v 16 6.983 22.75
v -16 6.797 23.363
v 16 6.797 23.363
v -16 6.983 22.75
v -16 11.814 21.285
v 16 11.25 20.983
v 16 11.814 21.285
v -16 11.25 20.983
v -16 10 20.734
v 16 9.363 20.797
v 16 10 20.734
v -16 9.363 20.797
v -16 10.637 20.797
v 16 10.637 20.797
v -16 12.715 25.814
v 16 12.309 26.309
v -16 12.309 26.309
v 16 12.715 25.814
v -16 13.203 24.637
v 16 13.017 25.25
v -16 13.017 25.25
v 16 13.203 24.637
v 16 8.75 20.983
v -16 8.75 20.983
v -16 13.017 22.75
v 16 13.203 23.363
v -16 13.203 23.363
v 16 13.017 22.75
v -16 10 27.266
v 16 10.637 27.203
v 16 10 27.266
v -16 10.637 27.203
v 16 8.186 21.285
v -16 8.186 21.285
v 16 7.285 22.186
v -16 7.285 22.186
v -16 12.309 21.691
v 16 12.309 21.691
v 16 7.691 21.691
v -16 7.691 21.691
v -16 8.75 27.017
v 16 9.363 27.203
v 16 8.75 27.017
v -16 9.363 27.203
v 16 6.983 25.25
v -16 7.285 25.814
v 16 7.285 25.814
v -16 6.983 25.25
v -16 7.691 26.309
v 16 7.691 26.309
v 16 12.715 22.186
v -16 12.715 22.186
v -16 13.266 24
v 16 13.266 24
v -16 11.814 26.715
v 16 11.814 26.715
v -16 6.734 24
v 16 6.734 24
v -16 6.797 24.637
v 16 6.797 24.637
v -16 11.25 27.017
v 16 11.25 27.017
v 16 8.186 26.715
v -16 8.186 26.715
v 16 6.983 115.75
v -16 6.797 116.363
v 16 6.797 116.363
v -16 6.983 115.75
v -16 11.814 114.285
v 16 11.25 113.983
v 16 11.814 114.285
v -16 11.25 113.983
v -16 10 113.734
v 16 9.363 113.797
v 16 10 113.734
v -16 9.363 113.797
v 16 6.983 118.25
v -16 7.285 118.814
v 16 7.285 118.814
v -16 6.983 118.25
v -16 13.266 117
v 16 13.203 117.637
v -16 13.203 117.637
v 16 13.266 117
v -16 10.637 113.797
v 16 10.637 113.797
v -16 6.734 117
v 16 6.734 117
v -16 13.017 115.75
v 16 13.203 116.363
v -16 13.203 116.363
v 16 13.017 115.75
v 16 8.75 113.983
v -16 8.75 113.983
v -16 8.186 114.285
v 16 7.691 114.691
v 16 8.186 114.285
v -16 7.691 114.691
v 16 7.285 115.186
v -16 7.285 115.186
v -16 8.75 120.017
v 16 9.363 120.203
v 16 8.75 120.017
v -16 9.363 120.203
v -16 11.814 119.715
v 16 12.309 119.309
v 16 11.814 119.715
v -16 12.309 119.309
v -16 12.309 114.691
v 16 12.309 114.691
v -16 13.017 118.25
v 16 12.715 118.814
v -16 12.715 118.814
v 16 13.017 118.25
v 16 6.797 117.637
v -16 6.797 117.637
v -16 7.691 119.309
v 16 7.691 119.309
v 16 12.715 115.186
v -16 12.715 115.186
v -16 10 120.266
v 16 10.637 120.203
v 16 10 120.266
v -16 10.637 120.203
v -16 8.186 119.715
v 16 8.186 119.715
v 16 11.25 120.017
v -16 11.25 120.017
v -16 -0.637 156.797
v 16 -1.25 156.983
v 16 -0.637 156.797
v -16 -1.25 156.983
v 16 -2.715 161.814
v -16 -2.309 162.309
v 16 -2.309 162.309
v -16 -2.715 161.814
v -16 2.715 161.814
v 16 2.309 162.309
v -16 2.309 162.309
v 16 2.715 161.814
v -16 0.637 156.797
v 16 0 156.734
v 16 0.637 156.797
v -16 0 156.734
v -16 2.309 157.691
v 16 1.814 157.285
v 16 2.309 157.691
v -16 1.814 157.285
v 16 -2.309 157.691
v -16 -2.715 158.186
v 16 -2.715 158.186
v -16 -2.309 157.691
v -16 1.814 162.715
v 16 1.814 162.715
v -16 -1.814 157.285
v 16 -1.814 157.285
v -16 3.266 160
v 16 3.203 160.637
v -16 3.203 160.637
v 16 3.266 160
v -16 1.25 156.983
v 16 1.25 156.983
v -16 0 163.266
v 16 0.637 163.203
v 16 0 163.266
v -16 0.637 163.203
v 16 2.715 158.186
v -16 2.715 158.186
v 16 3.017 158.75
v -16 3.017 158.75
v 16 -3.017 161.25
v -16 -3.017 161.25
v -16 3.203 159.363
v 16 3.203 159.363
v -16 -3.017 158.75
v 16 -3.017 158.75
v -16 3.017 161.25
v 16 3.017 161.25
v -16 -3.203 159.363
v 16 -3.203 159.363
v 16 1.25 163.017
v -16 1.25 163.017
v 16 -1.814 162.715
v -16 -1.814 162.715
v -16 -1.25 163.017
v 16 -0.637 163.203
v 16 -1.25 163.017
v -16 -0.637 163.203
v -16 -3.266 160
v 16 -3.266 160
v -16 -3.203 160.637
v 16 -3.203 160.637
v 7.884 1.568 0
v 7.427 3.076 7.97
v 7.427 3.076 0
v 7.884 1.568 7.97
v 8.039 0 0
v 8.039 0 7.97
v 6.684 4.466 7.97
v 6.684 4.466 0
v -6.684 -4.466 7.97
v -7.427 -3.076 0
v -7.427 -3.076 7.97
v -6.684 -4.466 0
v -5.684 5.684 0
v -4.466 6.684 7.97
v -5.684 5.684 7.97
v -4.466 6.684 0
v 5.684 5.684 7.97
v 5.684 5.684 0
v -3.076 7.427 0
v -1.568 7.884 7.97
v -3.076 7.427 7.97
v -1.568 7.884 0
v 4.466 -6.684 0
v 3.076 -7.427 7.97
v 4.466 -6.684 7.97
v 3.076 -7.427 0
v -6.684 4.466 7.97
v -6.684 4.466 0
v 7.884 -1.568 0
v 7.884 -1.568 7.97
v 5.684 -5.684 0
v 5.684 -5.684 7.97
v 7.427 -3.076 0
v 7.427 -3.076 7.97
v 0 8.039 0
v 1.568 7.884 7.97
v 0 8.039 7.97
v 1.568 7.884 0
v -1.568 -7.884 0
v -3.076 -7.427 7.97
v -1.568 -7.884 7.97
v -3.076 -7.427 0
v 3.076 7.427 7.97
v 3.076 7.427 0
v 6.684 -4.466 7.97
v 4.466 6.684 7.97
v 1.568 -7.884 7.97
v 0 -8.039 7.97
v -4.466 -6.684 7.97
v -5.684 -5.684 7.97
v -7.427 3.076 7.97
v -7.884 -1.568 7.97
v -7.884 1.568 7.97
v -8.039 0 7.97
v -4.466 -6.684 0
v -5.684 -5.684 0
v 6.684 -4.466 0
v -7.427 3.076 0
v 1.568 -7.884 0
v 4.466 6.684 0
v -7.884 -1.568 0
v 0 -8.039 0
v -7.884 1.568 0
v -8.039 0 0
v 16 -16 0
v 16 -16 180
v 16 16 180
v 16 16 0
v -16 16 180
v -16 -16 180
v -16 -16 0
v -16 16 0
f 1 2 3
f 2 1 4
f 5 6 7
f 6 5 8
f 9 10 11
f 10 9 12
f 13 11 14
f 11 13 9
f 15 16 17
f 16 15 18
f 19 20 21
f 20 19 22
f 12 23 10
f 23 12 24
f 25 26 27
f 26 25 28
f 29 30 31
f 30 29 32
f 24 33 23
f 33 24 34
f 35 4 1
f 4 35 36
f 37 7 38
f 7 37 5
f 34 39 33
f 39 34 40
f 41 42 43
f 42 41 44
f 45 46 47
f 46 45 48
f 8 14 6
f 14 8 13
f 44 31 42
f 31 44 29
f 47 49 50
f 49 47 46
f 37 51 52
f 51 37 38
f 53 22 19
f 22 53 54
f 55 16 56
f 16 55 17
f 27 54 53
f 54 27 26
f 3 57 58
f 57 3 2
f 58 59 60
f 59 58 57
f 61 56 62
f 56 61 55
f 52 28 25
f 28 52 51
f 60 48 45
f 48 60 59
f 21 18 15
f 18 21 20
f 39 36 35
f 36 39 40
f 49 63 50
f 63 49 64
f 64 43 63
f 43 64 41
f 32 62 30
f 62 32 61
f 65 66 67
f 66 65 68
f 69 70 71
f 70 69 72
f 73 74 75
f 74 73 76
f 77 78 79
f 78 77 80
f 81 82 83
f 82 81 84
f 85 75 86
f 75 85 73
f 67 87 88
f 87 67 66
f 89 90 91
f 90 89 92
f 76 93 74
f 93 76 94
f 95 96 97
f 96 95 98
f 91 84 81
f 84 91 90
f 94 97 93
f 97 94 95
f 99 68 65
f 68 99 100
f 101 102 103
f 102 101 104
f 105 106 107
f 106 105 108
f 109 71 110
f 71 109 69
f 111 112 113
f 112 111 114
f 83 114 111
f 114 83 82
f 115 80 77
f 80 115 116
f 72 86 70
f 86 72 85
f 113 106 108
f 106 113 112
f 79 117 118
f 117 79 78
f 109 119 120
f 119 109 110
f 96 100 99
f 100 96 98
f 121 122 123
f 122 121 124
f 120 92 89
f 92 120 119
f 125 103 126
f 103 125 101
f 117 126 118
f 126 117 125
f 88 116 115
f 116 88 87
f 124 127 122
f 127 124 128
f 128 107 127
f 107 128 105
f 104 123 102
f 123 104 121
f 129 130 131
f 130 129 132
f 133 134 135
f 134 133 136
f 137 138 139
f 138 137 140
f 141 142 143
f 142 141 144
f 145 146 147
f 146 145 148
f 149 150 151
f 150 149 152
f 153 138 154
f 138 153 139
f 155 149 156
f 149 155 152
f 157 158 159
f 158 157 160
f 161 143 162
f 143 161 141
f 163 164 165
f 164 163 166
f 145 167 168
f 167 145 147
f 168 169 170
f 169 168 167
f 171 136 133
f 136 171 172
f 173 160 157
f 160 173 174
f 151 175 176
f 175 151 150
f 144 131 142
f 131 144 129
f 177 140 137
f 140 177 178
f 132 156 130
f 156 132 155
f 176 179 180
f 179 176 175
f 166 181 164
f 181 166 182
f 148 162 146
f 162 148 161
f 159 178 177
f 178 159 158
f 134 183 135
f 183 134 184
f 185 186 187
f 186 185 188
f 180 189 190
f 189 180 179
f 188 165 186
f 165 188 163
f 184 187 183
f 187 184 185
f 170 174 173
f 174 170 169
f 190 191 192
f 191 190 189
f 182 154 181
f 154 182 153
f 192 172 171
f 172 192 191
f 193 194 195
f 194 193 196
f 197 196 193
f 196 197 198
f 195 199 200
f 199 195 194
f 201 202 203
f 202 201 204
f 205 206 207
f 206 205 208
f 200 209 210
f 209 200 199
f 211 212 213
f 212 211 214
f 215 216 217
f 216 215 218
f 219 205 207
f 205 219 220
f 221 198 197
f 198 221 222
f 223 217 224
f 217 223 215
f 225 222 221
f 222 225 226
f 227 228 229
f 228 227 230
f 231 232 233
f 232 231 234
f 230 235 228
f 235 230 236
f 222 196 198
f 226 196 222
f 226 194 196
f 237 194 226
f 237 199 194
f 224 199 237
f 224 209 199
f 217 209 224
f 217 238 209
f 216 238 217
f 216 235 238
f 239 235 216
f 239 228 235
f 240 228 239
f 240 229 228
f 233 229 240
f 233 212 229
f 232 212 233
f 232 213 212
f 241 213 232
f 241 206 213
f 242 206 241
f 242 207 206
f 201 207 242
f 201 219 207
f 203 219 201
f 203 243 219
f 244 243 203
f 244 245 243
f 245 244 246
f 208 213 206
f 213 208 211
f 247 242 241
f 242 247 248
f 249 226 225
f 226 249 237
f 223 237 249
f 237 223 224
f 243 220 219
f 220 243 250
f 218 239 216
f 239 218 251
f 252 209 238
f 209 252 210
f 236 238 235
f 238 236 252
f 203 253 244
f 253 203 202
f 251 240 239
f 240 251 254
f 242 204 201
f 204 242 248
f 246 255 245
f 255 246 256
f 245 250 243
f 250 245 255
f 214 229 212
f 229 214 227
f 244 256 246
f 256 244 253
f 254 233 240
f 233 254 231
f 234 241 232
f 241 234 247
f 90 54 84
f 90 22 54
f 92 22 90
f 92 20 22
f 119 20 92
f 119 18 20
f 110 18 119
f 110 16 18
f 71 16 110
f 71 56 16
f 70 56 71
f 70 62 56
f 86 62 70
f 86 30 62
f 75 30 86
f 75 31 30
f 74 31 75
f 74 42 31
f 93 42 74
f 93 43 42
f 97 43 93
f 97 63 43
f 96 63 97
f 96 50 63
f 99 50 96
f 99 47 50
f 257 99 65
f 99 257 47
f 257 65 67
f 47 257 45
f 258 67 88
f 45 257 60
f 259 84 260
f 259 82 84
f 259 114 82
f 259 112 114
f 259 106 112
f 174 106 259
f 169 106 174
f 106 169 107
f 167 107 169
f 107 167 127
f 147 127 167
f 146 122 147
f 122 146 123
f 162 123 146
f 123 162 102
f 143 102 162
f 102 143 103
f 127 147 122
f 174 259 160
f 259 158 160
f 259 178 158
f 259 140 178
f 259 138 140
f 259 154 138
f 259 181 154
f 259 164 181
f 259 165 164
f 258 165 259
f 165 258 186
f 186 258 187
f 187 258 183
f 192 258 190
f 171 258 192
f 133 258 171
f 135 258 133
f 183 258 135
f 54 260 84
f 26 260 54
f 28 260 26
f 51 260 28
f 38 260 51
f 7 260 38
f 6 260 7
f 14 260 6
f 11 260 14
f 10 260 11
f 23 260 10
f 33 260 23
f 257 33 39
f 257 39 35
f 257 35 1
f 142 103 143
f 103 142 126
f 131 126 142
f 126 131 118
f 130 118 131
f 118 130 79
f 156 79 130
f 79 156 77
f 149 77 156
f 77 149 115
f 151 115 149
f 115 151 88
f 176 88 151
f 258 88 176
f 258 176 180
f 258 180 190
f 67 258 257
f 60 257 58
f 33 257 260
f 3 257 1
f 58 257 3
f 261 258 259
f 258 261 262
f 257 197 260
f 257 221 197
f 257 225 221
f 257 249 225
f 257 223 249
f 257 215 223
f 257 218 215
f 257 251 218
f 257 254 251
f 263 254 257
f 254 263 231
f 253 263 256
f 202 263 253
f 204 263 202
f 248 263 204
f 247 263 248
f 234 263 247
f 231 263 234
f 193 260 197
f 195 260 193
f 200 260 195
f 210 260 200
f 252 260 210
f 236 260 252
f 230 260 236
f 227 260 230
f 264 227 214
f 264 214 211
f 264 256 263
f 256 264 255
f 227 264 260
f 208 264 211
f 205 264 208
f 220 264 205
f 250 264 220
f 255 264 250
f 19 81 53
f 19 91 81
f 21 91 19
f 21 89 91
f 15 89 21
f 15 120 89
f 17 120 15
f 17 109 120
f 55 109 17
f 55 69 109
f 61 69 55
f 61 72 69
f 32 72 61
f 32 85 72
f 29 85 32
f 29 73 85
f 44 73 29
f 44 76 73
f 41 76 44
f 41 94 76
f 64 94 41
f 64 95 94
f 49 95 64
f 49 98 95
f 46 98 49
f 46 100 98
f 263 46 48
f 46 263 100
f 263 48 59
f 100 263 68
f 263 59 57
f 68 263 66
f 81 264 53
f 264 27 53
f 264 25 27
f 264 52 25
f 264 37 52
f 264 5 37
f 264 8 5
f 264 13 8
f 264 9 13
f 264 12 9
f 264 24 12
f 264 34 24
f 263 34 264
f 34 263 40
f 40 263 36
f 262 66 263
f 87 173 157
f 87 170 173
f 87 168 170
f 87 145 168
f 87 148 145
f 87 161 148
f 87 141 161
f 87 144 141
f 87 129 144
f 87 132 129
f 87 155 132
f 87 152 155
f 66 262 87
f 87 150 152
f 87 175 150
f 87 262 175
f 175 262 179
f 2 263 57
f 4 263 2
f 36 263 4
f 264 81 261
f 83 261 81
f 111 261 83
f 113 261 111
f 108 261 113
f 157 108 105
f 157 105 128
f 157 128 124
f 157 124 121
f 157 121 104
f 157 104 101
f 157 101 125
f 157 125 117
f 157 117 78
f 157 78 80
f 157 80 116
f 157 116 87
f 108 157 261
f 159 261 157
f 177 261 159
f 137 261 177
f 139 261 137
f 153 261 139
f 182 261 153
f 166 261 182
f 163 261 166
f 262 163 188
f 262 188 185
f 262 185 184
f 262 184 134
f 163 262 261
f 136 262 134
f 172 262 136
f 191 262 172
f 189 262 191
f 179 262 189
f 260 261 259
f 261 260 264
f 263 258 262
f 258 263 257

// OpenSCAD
// file: ../../../../../scad/lib/parent_spar_bolted.scad
// Parent modular exterior v2. mm. Geometry shared by individual part wrappers.
// Metal fasteners, ballast, Takachi box and electronics are purchased items.
/* [Dimensions] */
disk_d=225; disk_t=5;
fin_h=125; fin_w=65; fin_t=4;
beam_w=32; clearance=0.5;
float_r=100; flange_r=112.5; float_bore_r=30;
float_wall=4; float_h=180; lid_t=6;
rod_r=105.5; flange_t=6;
hub_h=32; root_x=30; root_depth=14;
$fn=96; e=0.03;
assert(disk_d<=225 && 2*flange_r<=225);
assert(fin_h>=100 && fin_h<=150 && fin_w>=50 && fin_w<=80);
assert(root_x+fin_w<disk_d/2-5);
module bore(d,h) { cylinder(d=d/cos(180/32),h=h,$fn=32); }
module bore_x(d,l) { rotate([0,90,0]) bore(d,l); }
module bore_y(d,l) { rotate([-90,0,0]) bore(d,l); }
module square_bore(h) { translate([-(beam_w+clearance)/2,-(beam_w+clearance)/2,-e]) cube([beam_w+clearance,beam_w+clearance,h+2*e]); }
module rods(h,d=6.5) { for(a=[45:90:315]) rotate([0,0,a]) translate([rod_r,0,-e]) bore(d,h+2*e); }
module lid_bolts(h) { for(a=[22.5:45:359]) rotate([0,0,a]) translate([rod_r,0,-e]) bore(4.5,h+2*e); }
module hub_pin(z) { translate([-46,10,z]) bore_x(6.5,92); }
module disk() {
 difference() { cylinder(d=disk_d,h=disk_t); square_bore(disk_t);
  for(x=[-23,23],y=[-23,23]) translate([x,y,-e]) bore(5.5,disk_t+2*e);
 }
}
module fin() {
 difference() { cube([fin_w,fin_t,fin_h]);
  for(z=[10,fin_h-hub_h+10]) translate([root_depth/2,-e,z]) bore_y(5.5,fin_t+2*e);
 }
}
module hub() {
 difference() {
  union() { translate([-30,-30,0]) cube([60,60,hub_h]);
   for(a=[0:90:270]) rotate([0,0,a]) translate([28,-16,0]) cube([16,32,hub_h]);
  }
  square_bore(hub_h);
  for(a=[0:90:270]) rotate([0,0,a]) {
   translate([root_x-clearance/2,-(fin_t+clearance)/2,-e]) cube([root_depth+clearance,fin_t+clearance,hub_h+2*e]);
   translate([root_x+root_depth/2,-17,10]) bore_y(5.5,34);
  }
  for(x=[-23,23],y=[-23,23]) translate([x,y,-e]) bore(5.5,hub_h+2*e);
  hub_pin(24);
 }
}
module beam(lower=true) {
 len=lower?180:107;
 difference() { translate([-beam_w/2,-beam_w/2,0]) cube([beam_w,beam_w,len]);
  if(lower) { for(z=[24,117]) hub_pin(z); translate([-20,0,160]) bore_x(6.5,40); translate([0,0,-e]) bore(16,8); }
  else for(z=[20,87]) translate([-20,0,z]) bore_x(6.5,40);
 }
}
module coupler() {
 // One half of a screwed split coupler. Mirror Y for the second half.
 difference() { translate([-27,0.25,0]) cube([54,26.75,64]); square_bore(64);
  for(z=[12,52]) translate([-28,0,z]) bore_x(6.5,56);
  for(x=[-22,22],z=[24,40]) translate([x,-1,z]) bore_y(5.5,29);
 }
}
module float_body() {
 difference() {
  union() { cylinder(r=float_r,h=float_h);
   translate([0,0,float_h-flange_t]) cylinder(r=flange_r,h=flange_t);
   // 45-degree underside of the flange instead of a 15 mm unsupported ledge.
   translate([0,0,float_h-flange_t-(flange_r-float_r)]) cylinder(r1=float_r,r2=flange_r,h=flange_r-float_r);
  }
  translate([0,0,-e]) cylinder(r=float_bore_r,h=float_h+2*e);
  translate([0,0,float_wall]) difference() {
   cylinder(r=float_r-float_wall,h=float_h);
   cylinder(r=float_bore_r+float_wall,h=float_h+e);
  }
  // Coupling-nut clearance; nearest cavity wall remains >=3 mm thick.
  rods(float_h,13); lid_bolts(float_h);
  for(a=[22.5:45:359]) rotate([0,0,a]) translate([rod_r,0,-e]) bore(10,float_h-flange_t+e);
 }
}
module float_lid() {
 difference() {
  cylinder(r=flange_r,h=lid_t);
  translate([0,0,-e]) cylinder(r=float_bore_r,h=lid_t+2*e);
  rods(lid_t,13); lid_bolts(lid_t);
  // Continuous face seals: 2 mm cord, 2.4 wide x 1.5 deep grooves.
  for(r=[float_bore_r+float_wall/2,float_r-float_wall/2]) translate([0,0,-e]) difference() {
   cylinder(r=r+1.2,h=1.5+e); cylinder(r=r-1.2,h=1.5+2*e);
  }
 }
}
module float_end(top=true) {
 difference() {
  union() { cylinder(r=flange_r,h=8);
   if(top) translate([-30,-30,8-e]) cube([60,60,20+e]);
   else translate([-23,-23,-40]) cube([46,46,40+e]);
  }
  rods(8);
  if(top) for(x=[-20,20],y=[-20,20]) {
   translate([x,y,-e]) bore(5.5,29);
   translate([x,y,-e]) bore(11,18+e);
  }
  if(top) for(a=[22.5:45:359]) rotate([0,0,a]) translate([rod_r,0,-e]) bore(12,8+2*e);
  else { translate([0,0,-40]) square_bore(40-e);
   translate([-24,0,-20]) bore_x(6.5,48);
  }
 }
}
module ballast_body() {
 // Open upward in print orientation. In the assembly this cup is inverted.
 difference() {
  union() { cylinder(r=45,h=51); translate([0,0,45]) cylinder(r=60,h=6);
   translate([0,0,30]) cylinder(r1=45,r2=60,h=15);
  }
  translate([0,0,6]) cylinder(r=40,h=46);
  for(x=[-23,23],y=[-23,23]) translate([x,y,-e]) bore(5.5,7);
  translate([0,0,-e]) bore(8.5,7);
  for(a=[0:90:270]) rotate([0,0,a]) translate([52,0,29]) { bore(5.5,23); bore(12,16); }
 }
}
module ballast_lid() {
 difference() { cylinder(r=60,h=6);
  for(a=[0:90:270]) rotate([0,0,a]) translate([52,0,-e]) bore(5.5,7);
  // Flooded ballast compartment: drainage, no trapped air assumption.
  for(x=[-20,0,20]) translate([x,0,-e]) bore(6,7);
 }
}
module camera_bridge() {
 // Assembly frame: local top z=78; camera seat z=8. +Y faces camera front.
 difference() {
  union() {
   translate([-30,45,70]) cube([60,90,8]);
   translate([-70,125,0]) cube([140,100,8]);
   translate([-70,125,0]) cube([140,10,78]);
   for(x=[-64,56]) translate([x,0,0]) rotate([90,0,90]) linear_extrude(8)
    polygon([[135,8],[215,8],[135,70]]);
  }
  for(x=[-20,20],y=[50,90]) translate([x,y,69]) bore(5.5,10);
  for(x=[-11,11],y=[174,206]) translate([x,y,-e]) bore(5.5,10);
 }
}
module gps_bridge() {
 // Local attachment face X=0 at deck +X; top shelf z=175.
 difference() {
  union() { translate([0,-25,0]) cube([10,50,183]);
   translate([-90,-48,175]) cube([100,96,8]);
   for(y=[-17,25]) translate([0,y,0]) rotate([90,0,0]) linear_extrude(8)
    polygon([[e,155],[e,175+e],[-80,175+e]]);
  }
  for(y=[-20,20],z=[5,45]) translate([-e,y,z]) bore_x(5.5,11);
  for(y=[-34,34]) translate([-43,y,174]) bore(4.5,10);
 }
}
// Reference antenna envelope, correct mounting ears, not a printable antenna.
module gps_reference() {
 difference() {
  union() { translate([-30,-28,0]) cube([60,56,22.5]);
   translate([-10,-41,0]) cube([20,82,6]); }
  for(y=[-34,34]) translate([0,y,-e]) bore(4.5,7);
 }
}
// main file
// mm. part=print is the intended X1C orientation.
part="assembly"; // [assembly,print]
use <../../../../../scad/lib/parent_spar_bolted.scad>
if(part=="print") { translate([0,0,16]) rotate([0,90,0]) beam(true); } else { beam(true); }
